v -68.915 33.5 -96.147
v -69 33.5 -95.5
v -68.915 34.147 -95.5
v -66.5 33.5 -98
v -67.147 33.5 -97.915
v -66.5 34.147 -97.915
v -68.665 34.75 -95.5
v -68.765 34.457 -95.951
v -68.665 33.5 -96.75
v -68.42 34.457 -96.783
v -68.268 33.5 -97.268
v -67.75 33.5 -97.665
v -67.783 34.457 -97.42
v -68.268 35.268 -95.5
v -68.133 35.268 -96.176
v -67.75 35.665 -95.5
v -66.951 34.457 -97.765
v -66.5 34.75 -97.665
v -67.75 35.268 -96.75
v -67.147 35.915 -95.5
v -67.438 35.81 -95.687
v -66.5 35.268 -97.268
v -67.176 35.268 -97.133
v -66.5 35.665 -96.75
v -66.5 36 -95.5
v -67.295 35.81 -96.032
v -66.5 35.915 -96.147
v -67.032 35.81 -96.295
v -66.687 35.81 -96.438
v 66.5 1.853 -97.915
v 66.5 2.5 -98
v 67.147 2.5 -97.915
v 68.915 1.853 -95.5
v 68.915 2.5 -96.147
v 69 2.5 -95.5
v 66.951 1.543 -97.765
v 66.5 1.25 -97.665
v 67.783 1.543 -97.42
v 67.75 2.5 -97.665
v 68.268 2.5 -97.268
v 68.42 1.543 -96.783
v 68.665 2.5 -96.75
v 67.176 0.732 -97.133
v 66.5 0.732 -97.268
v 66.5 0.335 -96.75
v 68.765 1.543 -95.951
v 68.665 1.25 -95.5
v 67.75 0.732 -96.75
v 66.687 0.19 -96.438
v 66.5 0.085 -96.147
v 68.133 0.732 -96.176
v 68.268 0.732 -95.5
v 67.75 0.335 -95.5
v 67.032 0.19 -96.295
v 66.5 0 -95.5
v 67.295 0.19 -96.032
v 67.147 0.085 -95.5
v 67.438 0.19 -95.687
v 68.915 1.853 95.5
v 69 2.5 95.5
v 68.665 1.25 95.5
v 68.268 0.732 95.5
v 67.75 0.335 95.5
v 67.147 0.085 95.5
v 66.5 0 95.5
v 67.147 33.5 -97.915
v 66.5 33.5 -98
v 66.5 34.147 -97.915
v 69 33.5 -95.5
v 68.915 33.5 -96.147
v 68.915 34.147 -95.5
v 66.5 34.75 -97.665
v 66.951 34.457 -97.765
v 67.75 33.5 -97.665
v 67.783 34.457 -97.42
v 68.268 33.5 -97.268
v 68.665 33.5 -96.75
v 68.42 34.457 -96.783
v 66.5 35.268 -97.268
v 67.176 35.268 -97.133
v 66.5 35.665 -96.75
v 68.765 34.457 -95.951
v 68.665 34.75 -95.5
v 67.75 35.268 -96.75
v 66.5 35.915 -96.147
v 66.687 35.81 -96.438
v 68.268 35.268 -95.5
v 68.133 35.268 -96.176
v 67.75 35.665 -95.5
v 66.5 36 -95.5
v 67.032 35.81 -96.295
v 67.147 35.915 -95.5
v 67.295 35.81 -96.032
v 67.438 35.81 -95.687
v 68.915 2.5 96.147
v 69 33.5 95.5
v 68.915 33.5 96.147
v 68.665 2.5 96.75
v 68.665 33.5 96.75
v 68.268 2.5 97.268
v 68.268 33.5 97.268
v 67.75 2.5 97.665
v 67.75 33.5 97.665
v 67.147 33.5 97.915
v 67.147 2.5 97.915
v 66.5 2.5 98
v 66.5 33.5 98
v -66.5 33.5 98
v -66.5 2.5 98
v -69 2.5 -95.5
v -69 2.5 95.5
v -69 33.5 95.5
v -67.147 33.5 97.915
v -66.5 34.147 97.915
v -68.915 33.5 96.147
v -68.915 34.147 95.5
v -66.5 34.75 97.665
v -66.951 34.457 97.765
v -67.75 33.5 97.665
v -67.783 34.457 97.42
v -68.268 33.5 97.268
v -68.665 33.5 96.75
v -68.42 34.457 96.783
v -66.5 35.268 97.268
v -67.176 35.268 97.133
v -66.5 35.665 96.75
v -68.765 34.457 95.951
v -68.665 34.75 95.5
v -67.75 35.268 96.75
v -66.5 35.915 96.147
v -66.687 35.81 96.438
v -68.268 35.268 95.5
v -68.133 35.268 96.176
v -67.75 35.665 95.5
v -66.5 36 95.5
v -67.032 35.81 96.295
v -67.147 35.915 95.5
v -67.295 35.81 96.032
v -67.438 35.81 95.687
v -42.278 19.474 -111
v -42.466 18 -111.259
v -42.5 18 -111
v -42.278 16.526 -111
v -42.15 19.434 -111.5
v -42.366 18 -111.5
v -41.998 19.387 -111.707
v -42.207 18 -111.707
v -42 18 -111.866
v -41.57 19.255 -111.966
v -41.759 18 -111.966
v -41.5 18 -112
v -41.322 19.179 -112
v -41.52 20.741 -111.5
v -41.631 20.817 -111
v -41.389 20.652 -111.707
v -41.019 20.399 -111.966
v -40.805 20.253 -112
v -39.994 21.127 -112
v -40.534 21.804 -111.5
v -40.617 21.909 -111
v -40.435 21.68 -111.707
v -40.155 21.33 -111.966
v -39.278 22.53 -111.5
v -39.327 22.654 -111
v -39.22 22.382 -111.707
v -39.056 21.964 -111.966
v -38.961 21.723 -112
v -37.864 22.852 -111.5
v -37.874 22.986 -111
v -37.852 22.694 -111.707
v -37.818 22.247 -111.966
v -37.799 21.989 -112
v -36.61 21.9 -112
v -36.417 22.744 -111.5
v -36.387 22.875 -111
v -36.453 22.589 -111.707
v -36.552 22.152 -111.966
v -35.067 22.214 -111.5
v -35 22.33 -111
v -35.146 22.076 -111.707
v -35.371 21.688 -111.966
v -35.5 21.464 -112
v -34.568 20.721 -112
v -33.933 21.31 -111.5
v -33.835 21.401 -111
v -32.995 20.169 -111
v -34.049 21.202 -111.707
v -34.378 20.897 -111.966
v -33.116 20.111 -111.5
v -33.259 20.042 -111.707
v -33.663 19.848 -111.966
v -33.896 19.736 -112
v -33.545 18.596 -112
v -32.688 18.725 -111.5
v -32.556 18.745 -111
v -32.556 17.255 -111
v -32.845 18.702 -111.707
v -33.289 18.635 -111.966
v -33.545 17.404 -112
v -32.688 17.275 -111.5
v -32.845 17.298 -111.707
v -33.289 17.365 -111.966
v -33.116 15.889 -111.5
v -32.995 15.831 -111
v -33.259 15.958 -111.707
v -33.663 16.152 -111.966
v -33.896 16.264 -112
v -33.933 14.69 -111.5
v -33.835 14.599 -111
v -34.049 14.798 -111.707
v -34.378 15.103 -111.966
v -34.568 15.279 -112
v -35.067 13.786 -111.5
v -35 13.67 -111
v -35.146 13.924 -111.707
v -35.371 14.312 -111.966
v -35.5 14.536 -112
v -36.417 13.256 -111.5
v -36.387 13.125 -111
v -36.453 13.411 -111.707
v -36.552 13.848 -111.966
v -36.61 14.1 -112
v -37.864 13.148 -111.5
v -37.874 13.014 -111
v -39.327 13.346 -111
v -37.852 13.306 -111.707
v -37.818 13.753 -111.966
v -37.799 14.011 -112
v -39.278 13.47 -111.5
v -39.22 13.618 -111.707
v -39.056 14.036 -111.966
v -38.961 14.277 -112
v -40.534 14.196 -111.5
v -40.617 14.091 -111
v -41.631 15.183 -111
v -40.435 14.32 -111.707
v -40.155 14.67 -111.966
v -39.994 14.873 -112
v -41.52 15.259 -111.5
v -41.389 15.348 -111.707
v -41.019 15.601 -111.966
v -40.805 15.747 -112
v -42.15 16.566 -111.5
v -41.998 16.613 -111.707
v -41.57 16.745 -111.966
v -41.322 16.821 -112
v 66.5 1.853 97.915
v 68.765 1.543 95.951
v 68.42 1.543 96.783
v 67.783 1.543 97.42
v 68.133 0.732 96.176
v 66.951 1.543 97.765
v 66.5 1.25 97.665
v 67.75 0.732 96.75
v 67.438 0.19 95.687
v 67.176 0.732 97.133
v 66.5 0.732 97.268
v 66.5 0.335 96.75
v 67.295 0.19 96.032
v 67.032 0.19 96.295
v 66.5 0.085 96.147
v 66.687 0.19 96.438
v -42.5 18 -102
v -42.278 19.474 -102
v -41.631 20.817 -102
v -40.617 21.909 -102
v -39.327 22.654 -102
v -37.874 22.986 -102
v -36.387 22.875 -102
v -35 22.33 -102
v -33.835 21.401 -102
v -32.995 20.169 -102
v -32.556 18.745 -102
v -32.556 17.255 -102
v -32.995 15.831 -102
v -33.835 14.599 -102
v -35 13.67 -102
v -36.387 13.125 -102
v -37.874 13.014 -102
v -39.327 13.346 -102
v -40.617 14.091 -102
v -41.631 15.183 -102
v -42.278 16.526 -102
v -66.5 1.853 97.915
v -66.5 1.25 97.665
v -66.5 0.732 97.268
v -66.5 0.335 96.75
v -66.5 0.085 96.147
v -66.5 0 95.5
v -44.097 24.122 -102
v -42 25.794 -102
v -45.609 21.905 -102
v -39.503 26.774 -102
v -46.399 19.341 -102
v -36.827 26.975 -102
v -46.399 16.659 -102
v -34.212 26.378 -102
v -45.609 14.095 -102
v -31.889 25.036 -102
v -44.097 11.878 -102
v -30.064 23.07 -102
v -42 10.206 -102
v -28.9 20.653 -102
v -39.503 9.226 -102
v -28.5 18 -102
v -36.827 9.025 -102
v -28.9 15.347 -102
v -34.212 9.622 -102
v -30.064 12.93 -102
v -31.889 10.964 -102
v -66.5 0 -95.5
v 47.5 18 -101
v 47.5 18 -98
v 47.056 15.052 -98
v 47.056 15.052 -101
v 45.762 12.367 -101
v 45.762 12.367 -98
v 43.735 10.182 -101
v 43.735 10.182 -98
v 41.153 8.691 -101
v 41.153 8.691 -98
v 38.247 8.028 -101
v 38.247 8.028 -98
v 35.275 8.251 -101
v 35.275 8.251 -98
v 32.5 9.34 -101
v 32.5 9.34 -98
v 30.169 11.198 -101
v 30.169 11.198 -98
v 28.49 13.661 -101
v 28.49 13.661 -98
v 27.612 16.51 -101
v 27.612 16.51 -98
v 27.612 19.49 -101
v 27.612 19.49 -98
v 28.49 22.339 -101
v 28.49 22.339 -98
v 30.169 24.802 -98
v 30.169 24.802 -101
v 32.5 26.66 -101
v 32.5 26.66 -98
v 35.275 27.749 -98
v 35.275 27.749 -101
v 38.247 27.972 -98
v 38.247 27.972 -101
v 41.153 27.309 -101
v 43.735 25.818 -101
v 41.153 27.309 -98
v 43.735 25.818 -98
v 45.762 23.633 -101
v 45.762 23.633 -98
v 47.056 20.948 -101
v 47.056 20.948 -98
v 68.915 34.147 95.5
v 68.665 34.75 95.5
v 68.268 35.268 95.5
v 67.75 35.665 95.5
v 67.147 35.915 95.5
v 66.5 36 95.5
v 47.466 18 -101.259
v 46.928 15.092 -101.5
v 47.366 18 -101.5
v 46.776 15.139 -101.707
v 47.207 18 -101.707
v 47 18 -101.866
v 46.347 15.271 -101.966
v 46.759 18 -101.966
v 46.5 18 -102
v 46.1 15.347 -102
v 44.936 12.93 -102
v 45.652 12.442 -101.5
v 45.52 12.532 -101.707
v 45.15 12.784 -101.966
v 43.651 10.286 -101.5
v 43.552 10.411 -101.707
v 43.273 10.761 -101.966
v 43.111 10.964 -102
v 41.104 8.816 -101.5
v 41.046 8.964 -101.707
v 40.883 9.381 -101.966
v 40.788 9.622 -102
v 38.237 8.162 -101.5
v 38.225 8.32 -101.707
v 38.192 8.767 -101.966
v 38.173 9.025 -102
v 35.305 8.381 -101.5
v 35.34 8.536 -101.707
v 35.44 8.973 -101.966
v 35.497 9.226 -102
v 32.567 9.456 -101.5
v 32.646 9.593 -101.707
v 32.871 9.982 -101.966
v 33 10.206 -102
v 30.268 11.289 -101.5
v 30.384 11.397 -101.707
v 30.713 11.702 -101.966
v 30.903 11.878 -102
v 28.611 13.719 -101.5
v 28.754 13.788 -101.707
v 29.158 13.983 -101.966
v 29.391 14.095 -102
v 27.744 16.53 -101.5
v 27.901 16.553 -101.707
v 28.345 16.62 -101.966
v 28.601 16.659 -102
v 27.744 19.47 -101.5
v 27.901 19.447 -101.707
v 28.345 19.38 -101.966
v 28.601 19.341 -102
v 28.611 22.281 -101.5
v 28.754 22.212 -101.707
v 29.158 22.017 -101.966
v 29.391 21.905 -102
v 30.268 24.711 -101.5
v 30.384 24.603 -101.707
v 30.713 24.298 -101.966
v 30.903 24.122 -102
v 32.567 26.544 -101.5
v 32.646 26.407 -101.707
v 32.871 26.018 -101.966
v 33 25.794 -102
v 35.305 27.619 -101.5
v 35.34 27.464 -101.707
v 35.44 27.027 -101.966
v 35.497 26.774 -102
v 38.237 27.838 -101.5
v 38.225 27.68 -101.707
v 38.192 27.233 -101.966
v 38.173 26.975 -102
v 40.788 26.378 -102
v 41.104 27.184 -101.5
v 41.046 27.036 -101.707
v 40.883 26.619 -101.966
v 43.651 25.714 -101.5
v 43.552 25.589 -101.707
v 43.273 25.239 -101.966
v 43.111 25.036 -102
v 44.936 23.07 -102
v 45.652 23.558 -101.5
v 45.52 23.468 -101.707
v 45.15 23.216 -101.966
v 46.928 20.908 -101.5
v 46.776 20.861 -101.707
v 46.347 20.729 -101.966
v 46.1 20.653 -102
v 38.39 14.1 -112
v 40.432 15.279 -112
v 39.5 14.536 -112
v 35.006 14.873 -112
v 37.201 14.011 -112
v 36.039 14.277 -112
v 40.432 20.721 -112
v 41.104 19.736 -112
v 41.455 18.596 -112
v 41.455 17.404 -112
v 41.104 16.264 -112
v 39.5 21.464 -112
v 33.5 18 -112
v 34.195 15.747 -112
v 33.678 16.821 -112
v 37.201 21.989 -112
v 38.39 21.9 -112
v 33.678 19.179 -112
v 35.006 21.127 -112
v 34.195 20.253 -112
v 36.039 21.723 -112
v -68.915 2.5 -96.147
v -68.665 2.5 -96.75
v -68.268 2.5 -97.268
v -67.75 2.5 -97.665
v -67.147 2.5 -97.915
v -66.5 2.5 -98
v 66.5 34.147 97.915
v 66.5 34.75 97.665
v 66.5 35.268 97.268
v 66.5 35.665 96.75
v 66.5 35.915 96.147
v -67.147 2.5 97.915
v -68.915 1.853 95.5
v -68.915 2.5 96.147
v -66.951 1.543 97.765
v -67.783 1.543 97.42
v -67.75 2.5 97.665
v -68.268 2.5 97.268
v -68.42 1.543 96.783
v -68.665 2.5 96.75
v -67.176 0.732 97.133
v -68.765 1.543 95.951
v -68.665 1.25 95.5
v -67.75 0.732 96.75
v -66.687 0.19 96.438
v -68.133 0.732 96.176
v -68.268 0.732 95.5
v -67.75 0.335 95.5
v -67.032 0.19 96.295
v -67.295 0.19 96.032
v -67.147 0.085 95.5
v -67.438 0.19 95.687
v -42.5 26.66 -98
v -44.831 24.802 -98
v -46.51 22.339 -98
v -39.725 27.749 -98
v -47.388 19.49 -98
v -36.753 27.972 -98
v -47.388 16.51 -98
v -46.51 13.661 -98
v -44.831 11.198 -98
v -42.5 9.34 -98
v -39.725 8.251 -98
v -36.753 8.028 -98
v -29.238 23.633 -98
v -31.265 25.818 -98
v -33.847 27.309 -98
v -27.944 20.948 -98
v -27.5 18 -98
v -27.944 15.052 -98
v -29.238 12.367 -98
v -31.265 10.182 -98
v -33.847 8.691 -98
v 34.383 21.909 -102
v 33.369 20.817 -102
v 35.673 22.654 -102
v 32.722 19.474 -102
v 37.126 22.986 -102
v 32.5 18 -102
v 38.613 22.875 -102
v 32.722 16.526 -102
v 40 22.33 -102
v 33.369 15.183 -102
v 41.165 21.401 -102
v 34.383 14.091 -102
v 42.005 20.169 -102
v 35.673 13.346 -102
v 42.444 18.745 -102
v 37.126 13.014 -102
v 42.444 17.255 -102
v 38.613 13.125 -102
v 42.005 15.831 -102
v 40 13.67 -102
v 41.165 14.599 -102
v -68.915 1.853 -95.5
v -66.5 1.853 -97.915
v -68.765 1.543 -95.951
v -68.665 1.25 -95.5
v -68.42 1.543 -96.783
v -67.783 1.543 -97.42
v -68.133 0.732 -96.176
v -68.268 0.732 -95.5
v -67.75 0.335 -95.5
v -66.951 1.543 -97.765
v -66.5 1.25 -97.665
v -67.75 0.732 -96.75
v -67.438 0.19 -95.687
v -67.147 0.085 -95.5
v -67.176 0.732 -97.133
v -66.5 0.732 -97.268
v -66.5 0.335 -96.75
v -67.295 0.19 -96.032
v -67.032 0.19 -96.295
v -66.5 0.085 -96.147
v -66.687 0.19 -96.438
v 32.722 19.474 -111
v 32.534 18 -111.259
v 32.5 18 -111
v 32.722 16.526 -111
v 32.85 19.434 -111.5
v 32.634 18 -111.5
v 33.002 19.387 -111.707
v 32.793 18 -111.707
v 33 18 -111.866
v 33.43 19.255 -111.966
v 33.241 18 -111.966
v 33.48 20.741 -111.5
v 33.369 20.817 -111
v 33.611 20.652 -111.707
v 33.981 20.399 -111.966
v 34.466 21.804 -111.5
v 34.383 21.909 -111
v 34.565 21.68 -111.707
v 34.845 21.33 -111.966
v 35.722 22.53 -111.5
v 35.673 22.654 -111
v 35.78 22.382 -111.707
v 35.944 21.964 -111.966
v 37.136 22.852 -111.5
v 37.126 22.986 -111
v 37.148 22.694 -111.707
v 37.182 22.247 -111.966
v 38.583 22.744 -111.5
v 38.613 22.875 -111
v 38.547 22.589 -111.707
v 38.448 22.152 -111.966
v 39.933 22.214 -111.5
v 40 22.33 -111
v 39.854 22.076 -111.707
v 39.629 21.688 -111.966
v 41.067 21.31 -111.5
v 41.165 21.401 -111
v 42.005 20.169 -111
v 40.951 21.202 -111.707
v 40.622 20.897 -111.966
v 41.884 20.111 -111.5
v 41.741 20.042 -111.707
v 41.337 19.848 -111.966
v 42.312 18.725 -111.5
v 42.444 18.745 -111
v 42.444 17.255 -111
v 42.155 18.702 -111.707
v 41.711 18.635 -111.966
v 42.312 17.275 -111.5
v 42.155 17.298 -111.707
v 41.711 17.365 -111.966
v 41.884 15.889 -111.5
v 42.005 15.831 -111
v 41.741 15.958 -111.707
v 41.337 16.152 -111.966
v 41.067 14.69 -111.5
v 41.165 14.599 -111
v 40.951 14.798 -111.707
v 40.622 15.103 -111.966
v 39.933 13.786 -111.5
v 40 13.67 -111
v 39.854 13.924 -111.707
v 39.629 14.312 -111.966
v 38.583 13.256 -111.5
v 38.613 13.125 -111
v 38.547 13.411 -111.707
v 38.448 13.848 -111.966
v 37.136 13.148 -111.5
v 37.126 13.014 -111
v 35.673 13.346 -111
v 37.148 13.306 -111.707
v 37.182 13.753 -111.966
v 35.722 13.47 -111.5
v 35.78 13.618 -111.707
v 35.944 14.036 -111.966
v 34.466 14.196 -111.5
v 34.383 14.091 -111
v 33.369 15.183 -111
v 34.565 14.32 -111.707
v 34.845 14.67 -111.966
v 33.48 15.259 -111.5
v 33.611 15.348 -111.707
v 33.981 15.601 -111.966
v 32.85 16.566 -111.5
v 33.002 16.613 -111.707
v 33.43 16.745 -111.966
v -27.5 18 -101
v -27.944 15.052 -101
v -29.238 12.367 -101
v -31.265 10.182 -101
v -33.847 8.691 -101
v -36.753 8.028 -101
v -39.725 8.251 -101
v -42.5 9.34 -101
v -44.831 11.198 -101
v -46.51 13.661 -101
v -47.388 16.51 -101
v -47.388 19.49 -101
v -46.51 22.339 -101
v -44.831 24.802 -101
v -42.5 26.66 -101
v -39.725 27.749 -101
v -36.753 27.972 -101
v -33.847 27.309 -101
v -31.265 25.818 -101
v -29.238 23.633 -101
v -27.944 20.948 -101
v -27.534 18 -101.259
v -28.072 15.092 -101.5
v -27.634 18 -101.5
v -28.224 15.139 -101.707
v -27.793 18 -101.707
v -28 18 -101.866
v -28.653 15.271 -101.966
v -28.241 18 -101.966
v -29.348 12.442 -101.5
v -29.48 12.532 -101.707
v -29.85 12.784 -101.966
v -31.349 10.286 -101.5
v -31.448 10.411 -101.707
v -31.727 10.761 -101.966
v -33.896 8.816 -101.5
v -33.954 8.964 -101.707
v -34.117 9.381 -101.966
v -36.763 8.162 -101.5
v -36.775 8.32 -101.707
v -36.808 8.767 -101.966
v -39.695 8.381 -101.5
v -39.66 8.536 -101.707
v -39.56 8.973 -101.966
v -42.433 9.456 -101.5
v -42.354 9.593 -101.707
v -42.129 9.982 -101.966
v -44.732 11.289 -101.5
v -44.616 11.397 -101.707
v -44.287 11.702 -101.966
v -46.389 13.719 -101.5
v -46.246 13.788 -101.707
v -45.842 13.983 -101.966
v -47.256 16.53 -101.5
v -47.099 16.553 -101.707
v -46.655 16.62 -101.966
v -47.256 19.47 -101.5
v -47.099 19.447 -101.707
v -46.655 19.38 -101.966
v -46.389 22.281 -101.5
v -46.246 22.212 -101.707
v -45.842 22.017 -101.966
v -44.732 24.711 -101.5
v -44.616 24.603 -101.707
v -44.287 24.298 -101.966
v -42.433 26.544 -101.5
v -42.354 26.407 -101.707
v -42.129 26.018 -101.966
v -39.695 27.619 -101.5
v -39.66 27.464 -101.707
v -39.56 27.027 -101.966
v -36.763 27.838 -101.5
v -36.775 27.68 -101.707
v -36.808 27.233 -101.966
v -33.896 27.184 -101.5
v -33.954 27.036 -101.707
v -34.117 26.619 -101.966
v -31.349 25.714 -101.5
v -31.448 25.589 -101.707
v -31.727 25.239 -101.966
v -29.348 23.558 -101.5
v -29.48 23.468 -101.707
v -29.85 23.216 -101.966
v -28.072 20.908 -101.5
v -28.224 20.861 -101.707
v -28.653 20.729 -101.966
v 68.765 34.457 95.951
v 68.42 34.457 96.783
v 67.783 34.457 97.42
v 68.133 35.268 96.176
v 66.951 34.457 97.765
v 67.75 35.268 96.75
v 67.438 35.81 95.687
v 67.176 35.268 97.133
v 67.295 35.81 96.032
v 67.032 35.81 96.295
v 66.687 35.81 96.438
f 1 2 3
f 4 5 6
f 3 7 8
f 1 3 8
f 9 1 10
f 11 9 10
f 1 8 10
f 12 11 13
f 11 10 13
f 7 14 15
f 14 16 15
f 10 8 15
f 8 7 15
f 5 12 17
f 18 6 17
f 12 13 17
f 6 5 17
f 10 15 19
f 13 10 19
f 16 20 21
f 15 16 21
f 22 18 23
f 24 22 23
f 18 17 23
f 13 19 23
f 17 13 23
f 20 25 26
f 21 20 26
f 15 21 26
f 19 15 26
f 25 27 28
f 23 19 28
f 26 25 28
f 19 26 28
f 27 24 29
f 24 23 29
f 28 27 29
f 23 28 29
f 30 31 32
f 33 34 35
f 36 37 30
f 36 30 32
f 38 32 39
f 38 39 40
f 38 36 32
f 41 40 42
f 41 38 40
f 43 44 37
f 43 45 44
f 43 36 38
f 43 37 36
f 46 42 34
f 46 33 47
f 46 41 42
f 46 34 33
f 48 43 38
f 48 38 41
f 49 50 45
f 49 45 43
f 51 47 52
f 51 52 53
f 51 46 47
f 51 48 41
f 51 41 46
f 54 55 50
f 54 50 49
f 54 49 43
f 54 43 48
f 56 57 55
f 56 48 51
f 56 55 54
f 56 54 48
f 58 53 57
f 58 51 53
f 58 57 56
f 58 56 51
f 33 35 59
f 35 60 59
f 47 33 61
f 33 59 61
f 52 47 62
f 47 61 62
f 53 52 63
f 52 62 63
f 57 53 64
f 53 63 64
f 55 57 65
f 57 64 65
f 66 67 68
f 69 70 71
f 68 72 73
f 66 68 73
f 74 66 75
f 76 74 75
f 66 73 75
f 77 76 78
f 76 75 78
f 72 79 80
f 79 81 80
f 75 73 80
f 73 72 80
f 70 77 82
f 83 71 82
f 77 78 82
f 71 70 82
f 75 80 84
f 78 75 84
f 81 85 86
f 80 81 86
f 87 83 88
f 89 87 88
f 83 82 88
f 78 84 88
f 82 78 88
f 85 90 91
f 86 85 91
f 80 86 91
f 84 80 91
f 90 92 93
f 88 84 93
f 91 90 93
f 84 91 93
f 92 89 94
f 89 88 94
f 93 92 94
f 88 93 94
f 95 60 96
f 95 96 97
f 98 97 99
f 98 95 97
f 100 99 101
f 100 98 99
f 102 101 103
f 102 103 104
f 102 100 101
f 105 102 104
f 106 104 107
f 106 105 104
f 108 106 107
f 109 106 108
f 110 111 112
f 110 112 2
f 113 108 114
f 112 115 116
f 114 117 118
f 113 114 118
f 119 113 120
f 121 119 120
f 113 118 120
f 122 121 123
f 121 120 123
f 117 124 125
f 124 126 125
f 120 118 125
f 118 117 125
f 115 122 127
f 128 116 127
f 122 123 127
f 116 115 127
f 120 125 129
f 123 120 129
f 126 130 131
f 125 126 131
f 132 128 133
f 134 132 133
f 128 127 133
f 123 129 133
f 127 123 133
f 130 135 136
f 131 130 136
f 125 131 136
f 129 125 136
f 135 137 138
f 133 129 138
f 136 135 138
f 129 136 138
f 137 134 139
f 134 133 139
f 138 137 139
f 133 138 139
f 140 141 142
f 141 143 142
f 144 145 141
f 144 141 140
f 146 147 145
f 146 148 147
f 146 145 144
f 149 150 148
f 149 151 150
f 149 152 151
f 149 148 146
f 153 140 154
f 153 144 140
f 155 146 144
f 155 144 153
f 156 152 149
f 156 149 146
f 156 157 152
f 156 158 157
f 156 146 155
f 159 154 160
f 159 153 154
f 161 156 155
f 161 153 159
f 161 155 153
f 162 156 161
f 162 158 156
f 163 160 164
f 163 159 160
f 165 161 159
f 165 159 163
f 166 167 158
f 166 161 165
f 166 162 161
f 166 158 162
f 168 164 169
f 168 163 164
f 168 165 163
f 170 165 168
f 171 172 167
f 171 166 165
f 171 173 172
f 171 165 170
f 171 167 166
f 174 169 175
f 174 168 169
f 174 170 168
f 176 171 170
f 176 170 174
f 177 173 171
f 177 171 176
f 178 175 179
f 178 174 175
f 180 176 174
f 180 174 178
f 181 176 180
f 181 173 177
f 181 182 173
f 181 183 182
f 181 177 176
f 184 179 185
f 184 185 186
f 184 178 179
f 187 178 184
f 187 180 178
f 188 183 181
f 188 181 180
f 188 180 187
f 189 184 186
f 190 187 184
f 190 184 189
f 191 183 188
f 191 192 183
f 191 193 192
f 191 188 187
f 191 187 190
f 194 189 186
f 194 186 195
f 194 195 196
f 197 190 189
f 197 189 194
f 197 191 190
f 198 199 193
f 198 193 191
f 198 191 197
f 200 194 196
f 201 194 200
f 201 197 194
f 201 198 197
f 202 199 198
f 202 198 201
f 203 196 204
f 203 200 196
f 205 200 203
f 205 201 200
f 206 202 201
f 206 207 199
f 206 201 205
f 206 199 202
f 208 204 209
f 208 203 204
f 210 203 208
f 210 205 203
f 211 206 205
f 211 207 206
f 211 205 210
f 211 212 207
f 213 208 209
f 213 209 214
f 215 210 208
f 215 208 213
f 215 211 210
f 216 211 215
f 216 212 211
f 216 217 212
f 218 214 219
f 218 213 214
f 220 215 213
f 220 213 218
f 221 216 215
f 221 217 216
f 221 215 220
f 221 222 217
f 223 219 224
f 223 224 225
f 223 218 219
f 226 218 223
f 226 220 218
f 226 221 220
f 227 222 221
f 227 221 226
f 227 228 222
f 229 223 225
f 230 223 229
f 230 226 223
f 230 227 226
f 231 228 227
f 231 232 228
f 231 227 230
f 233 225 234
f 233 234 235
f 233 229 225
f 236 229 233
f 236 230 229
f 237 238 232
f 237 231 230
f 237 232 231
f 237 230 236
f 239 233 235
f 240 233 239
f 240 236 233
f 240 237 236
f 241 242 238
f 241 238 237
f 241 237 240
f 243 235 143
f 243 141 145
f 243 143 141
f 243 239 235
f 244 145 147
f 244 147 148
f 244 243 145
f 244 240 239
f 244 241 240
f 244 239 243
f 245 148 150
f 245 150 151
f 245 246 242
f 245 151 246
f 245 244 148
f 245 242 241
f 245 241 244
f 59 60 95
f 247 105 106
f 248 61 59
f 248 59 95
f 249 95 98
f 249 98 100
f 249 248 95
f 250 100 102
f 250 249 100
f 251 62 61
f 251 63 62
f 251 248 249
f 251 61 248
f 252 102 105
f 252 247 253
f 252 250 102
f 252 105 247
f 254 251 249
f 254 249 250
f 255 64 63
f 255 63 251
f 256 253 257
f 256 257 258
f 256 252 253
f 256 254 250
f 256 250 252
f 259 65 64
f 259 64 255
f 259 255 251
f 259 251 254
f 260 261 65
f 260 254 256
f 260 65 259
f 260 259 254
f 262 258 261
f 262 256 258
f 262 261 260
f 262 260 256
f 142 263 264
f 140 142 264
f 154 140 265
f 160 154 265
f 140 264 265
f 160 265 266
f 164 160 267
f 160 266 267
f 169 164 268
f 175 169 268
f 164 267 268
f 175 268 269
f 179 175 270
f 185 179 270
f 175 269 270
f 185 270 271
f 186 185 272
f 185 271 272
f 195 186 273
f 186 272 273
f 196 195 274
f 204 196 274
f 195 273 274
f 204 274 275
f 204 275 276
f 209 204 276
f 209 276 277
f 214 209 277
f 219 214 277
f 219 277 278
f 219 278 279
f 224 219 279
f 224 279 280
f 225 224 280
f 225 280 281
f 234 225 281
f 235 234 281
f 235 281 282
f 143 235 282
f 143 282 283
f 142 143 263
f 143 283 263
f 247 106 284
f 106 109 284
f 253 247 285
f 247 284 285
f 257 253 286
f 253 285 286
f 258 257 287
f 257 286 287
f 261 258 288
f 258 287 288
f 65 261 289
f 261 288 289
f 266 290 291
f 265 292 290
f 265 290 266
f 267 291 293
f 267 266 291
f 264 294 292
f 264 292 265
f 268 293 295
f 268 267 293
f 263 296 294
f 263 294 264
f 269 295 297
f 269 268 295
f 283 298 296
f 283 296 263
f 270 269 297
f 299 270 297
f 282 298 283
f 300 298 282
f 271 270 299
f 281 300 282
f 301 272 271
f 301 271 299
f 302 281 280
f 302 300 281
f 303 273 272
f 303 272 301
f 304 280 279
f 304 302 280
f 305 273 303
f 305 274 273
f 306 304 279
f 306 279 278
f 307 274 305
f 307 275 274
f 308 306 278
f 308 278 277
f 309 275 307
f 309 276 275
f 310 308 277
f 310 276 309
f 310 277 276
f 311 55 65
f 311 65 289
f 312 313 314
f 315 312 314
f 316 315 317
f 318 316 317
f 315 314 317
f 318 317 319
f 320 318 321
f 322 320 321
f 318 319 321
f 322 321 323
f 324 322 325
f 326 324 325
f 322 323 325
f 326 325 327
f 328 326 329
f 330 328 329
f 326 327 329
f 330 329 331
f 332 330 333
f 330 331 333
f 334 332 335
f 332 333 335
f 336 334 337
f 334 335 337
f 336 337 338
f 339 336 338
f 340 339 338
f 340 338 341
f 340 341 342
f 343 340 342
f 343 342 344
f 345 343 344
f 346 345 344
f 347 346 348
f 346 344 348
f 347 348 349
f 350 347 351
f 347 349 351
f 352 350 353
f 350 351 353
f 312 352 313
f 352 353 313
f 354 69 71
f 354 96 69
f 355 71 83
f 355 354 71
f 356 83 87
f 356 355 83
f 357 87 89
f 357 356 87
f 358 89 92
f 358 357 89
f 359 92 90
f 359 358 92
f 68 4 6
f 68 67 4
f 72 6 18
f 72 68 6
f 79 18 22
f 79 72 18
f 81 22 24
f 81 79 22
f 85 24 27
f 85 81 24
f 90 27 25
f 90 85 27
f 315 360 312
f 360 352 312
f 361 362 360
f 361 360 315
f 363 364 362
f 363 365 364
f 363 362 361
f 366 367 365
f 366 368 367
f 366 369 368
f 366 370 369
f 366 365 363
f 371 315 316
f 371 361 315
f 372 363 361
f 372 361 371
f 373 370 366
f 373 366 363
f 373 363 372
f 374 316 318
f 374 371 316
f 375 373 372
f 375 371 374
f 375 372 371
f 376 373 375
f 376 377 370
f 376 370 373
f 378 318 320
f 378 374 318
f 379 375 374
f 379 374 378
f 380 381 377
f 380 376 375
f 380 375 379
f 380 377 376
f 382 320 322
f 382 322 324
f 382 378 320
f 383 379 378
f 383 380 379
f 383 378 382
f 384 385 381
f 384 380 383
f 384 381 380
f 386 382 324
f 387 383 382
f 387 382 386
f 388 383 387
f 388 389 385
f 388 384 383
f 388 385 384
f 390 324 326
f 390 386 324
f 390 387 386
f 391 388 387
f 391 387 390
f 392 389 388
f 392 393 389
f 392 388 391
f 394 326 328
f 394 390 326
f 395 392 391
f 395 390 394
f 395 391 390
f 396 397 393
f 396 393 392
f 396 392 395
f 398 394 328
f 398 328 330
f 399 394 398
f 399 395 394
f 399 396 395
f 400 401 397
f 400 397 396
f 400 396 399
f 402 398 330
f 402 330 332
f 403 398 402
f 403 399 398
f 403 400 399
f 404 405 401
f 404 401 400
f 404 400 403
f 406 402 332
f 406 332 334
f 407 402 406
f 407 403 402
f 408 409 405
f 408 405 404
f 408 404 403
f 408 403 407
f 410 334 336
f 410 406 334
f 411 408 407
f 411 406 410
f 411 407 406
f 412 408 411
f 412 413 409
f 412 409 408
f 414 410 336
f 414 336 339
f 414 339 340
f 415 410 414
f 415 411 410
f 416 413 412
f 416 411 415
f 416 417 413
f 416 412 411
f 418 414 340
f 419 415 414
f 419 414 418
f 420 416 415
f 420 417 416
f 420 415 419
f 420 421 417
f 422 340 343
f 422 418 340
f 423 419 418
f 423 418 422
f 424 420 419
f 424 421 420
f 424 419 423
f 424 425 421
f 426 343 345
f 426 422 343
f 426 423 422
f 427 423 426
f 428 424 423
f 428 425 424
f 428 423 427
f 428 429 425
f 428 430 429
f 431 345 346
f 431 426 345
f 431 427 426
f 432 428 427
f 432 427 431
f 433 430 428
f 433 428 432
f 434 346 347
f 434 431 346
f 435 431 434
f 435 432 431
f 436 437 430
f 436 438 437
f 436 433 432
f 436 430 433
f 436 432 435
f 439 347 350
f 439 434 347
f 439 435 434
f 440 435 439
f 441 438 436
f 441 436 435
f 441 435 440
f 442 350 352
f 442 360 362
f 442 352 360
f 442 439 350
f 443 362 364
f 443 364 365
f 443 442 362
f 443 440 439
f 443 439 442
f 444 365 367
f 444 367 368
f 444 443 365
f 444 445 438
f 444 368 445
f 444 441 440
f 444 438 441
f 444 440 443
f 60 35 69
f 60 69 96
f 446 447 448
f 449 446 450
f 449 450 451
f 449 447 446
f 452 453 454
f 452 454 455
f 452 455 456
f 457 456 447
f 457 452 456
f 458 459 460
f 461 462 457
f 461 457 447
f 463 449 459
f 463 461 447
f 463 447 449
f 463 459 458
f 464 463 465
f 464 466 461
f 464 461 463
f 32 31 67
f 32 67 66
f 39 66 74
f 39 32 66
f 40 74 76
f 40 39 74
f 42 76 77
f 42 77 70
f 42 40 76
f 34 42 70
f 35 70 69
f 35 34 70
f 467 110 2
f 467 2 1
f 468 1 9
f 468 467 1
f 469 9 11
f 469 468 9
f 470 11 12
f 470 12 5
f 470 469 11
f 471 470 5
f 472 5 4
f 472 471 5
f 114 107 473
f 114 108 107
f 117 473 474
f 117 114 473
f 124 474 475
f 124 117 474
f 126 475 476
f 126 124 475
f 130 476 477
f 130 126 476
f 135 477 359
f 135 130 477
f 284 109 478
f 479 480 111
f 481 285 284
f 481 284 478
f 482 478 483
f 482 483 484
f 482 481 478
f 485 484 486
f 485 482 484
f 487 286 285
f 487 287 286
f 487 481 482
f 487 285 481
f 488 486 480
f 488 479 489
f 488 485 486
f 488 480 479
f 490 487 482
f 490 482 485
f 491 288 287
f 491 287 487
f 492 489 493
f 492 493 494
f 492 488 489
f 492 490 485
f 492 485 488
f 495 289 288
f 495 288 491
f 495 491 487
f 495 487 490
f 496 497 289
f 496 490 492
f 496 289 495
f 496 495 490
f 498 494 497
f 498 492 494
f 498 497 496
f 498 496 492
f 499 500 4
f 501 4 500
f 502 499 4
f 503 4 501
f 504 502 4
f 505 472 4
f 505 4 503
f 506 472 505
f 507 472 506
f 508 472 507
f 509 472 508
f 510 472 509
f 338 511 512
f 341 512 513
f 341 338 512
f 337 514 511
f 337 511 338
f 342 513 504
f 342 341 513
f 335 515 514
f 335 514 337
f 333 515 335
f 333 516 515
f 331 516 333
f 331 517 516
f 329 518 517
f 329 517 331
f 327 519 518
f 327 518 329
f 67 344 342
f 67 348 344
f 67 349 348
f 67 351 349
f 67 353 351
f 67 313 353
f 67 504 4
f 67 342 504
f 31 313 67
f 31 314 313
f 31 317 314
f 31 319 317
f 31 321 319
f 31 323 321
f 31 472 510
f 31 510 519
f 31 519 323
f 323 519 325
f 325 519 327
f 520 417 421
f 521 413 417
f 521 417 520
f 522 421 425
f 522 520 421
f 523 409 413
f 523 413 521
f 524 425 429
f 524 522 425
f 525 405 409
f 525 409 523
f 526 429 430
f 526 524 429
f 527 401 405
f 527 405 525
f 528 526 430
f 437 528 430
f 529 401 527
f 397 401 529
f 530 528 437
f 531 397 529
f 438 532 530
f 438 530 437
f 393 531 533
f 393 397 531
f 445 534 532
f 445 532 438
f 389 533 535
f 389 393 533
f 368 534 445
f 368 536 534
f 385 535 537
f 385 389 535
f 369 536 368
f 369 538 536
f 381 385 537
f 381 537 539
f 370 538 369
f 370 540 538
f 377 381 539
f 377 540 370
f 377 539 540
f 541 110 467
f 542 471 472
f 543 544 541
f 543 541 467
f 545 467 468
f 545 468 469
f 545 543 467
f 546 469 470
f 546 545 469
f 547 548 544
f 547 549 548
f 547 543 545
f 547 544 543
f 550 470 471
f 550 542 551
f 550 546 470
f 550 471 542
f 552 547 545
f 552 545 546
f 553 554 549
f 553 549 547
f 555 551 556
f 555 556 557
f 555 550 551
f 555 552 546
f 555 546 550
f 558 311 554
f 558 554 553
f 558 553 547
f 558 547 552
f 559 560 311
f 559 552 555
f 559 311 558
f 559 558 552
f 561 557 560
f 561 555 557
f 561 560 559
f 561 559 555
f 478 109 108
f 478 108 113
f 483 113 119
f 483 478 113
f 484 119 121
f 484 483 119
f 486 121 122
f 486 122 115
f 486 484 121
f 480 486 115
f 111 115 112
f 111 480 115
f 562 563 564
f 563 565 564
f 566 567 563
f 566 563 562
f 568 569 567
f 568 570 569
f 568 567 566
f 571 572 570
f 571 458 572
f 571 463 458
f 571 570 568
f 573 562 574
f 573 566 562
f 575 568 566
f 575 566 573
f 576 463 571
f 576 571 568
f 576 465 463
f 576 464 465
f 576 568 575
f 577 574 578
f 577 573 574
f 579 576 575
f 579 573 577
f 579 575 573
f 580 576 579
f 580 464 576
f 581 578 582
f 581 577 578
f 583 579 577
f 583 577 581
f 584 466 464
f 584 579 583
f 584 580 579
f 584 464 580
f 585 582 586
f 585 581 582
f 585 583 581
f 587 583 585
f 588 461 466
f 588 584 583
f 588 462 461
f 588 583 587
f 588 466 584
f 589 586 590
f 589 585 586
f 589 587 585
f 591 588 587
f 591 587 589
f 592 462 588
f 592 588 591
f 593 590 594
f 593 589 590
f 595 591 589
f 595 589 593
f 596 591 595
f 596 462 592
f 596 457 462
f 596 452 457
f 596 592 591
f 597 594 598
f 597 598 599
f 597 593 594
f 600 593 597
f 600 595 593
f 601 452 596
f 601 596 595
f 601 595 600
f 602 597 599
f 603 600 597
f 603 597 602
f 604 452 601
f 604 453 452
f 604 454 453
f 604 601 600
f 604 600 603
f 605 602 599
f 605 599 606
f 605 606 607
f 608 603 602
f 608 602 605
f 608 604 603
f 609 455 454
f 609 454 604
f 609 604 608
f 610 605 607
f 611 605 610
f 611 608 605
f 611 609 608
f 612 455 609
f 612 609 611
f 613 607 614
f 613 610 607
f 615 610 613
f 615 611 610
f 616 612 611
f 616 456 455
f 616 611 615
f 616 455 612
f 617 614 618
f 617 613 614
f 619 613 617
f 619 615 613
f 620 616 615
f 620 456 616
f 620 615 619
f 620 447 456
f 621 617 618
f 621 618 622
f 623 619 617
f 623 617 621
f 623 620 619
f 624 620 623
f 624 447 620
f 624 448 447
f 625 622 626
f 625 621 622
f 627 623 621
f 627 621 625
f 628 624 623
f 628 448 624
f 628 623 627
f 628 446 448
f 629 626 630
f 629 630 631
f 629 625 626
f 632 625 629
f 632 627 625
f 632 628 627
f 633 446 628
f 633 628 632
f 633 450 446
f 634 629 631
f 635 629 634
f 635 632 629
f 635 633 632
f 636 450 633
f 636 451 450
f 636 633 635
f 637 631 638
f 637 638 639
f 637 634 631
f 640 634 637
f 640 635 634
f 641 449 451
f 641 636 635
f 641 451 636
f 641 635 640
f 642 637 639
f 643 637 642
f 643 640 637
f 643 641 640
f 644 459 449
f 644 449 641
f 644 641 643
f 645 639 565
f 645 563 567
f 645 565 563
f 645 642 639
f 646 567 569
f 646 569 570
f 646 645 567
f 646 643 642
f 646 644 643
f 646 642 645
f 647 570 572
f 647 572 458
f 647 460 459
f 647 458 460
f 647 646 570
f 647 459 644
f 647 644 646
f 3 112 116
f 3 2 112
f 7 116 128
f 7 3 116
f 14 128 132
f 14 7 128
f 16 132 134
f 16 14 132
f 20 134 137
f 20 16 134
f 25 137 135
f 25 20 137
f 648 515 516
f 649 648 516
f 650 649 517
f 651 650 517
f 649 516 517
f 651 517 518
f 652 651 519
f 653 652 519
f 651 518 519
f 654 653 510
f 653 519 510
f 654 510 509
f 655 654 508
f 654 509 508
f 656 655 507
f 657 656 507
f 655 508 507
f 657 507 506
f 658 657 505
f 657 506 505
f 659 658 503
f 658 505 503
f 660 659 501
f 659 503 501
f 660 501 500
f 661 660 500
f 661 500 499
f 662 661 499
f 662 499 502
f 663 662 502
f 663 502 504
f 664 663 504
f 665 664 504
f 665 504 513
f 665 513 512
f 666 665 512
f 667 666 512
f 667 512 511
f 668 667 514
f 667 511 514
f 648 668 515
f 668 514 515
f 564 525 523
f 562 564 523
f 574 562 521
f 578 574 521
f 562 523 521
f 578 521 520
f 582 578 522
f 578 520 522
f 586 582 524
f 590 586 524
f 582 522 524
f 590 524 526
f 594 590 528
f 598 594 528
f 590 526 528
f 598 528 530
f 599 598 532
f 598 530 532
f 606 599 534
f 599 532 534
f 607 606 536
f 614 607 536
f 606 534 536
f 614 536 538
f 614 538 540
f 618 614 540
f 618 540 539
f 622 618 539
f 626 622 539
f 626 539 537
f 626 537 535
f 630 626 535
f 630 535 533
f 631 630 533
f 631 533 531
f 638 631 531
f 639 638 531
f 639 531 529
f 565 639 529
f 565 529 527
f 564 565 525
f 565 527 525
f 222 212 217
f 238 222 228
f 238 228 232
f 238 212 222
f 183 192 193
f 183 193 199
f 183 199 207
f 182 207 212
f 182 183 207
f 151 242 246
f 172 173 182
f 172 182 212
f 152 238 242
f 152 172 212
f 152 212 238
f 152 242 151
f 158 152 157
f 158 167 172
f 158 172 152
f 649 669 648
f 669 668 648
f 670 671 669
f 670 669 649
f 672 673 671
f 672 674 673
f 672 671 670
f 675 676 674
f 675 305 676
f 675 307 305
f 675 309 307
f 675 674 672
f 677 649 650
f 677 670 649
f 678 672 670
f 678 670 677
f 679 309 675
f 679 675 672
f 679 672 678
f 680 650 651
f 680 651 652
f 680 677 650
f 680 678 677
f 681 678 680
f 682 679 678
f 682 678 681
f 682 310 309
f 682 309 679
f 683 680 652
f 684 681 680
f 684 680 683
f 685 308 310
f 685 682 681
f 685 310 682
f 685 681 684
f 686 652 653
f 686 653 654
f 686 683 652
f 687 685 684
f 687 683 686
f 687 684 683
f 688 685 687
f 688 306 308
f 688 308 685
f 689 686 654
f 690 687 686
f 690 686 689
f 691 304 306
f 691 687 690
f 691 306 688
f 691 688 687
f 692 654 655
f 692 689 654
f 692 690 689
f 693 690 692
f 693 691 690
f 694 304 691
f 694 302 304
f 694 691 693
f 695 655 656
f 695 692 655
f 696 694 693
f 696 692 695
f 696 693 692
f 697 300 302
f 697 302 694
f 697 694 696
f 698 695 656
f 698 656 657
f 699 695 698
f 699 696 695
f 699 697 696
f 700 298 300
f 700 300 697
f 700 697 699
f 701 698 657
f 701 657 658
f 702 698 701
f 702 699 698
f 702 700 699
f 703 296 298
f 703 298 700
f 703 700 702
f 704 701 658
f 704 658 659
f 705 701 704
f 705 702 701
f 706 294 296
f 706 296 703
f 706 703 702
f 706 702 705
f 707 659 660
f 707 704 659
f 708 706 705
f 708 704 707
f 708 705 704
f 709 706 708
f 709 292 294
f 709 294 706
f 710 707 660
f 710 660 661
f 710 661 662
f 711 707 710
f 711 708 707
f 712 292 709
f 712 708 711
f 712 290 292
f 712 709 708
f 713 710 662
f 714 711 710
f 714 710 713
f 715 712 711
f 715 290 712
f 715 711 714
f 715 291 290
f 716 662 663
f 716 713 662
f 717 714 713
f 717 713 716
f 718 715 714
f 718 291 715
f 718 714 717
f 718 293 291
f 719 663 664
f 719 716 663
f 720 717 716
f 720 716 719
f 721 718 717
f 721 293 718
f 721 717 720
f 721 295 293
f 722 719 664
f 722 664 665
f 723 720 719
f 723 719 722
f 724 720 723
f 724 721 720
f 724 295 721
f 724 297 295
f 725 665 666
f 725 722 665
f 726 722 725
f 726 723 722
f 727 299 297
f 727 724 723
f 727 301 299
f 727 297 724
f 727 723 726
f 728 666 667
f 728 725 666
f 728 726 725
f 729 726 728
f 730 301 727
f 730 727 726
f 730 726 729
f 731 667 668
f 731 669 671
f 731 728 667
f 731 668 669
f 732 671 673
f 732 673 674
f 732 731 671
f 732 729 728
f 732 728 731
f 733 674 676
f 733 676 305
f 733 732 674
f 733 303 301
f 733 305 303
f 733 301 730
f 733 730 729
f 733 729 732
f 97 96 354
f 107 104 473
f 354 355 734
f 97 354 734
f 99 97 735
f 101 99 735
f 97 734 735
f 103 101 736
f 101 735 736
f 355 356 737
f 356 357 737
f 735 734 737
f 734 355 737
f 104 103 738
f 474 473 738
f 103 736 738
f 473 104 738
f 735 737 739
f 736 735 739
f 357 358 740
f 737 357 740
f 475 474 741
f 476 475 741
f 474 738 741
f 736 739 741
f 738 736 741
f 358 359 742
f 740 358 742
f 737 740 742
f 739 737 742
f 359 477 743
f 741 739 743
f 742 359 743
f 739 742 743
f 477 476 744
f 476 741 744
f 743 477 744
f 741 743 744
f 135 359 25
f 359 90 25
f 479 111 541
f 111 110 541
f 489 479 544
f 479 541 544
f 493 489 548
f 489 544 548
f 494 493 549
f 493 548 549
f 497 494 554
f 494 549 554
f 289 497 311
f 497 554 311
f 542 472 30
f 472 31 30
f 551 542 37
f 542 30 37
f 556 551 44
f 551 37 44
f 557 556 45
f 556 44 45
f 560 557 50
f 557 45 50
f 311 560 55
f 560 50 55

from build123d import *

# Parameters (mm, degrees)
BOSS_EXTRUDE1_DEPTH = 36
FILLET1_R           = 2.5
SKETCH2_R           = 10
BOSS_EXTRUDE2_DEPTH = 4
SKETCH3_R           = 5
BOSS_EXTRUDE3_DEPTH = 10
FILLET2_R           = 1


with BuildPart() as part:
    # Sketch1 → Boss-Extrude1 (new body)
    with BuildSketch(Plane(origin=(0, 0, 0), x_dir=(1, 0, 0), z_dir=(0, 1, 0))):
        with BuildLine():
            Line((66.5, -98), (-66.5, -98))
            ThreePointArc((-66.5, -98), (-68.267766953, -97.267766953), (-69, -95.5))
            Line((-69, -95.5), (-69, 95.5))
            ThreePointArc((-69, 95.5), (-68.267766953, 97.267766953), (-66.5, 98))
            Line((-66.5, 98), (66.5, 98))
            ThreePointArc((66.5, 98), (68.267766953, 97.267766953), (69, 95.5))
            Line((69, 95.5), (69, -95.5))
            ThreePointArc((69, -95.5), (68.267766953, -97.267766953), (66.5, -98))
        make_face()
    extrude(amount=BOSS_EXTRUDE1_DEPTH)

    # Fillet1
    fillet1_edges = [part.edges().sort_by_distance(p)[0] for p in [
        (69, 0, 0),
        (68.267766953, 0, 97.267766953),
        (0, 0, 98),
        (-68.267766953, 0, 97.267766953),
        (68.267766953, 36, 97.267766953),
        (69, 36, 0),
        (68.267766953, 36, -97.267766953),
        (0, 36, -98),
        (-68.267766953, 36, -97.267766953),
        (-69, 36, 0),
        (-68.267766953, 36, 97.267766953),
        (-69, 0, 0),
        (0, 36, 98),
        (-68.267766953, 0, -97.267766953),
        (0, 0, -98),
        (68.267766953, 0, -97.267766953),
    ]]
    fillet(fillet1_edges, radius=FILLET1_R)

    # Sketch2 → Boss-Extrude2 (add)
    with BuildSketch(Plane(origin=(0, 0, -98), x_dir=(-1, 0, 0), z_dir=(0, 0, -1))):
        with Locations(Location((-37.5, 18, 0), (0, 0, 180))):
            Circle(SKETCH2_R)
        with Locations(Location((37.5, 18, 0), (0, 0, 180))):
            Circle(SKETCH2_R)
    extrude(amount=BOSS_EXTRUDE2_DEPTH)

    # Sketch3 → Boss-Extrude3 (add)
    with BuildSketch(Plane(origin=(0, 0, -102), x_dir=(-1, 0, 0), z_dir=(0, 0, -1))):
        with Locations((-37.5, 18)):
            Circle(SKETCH3_R)
        with Locations((37.5, 18)):
            Circle(SKETCH3_R)
    extrude(amount=BOSS_EXTRUDE3_DEPTH)

    # Fillet2
    fillet2_edges = [part.edges().sort_by_distance(p)[0] for p in [
        (27.5, 18, -102),
        (-47.5, 18, -102),
        (42.5, 18, -112),
        (-32.5, 18, -112),
    ]]
    fillet(fillet2_edges, radius=FILLET2_R)


solid = part.part
